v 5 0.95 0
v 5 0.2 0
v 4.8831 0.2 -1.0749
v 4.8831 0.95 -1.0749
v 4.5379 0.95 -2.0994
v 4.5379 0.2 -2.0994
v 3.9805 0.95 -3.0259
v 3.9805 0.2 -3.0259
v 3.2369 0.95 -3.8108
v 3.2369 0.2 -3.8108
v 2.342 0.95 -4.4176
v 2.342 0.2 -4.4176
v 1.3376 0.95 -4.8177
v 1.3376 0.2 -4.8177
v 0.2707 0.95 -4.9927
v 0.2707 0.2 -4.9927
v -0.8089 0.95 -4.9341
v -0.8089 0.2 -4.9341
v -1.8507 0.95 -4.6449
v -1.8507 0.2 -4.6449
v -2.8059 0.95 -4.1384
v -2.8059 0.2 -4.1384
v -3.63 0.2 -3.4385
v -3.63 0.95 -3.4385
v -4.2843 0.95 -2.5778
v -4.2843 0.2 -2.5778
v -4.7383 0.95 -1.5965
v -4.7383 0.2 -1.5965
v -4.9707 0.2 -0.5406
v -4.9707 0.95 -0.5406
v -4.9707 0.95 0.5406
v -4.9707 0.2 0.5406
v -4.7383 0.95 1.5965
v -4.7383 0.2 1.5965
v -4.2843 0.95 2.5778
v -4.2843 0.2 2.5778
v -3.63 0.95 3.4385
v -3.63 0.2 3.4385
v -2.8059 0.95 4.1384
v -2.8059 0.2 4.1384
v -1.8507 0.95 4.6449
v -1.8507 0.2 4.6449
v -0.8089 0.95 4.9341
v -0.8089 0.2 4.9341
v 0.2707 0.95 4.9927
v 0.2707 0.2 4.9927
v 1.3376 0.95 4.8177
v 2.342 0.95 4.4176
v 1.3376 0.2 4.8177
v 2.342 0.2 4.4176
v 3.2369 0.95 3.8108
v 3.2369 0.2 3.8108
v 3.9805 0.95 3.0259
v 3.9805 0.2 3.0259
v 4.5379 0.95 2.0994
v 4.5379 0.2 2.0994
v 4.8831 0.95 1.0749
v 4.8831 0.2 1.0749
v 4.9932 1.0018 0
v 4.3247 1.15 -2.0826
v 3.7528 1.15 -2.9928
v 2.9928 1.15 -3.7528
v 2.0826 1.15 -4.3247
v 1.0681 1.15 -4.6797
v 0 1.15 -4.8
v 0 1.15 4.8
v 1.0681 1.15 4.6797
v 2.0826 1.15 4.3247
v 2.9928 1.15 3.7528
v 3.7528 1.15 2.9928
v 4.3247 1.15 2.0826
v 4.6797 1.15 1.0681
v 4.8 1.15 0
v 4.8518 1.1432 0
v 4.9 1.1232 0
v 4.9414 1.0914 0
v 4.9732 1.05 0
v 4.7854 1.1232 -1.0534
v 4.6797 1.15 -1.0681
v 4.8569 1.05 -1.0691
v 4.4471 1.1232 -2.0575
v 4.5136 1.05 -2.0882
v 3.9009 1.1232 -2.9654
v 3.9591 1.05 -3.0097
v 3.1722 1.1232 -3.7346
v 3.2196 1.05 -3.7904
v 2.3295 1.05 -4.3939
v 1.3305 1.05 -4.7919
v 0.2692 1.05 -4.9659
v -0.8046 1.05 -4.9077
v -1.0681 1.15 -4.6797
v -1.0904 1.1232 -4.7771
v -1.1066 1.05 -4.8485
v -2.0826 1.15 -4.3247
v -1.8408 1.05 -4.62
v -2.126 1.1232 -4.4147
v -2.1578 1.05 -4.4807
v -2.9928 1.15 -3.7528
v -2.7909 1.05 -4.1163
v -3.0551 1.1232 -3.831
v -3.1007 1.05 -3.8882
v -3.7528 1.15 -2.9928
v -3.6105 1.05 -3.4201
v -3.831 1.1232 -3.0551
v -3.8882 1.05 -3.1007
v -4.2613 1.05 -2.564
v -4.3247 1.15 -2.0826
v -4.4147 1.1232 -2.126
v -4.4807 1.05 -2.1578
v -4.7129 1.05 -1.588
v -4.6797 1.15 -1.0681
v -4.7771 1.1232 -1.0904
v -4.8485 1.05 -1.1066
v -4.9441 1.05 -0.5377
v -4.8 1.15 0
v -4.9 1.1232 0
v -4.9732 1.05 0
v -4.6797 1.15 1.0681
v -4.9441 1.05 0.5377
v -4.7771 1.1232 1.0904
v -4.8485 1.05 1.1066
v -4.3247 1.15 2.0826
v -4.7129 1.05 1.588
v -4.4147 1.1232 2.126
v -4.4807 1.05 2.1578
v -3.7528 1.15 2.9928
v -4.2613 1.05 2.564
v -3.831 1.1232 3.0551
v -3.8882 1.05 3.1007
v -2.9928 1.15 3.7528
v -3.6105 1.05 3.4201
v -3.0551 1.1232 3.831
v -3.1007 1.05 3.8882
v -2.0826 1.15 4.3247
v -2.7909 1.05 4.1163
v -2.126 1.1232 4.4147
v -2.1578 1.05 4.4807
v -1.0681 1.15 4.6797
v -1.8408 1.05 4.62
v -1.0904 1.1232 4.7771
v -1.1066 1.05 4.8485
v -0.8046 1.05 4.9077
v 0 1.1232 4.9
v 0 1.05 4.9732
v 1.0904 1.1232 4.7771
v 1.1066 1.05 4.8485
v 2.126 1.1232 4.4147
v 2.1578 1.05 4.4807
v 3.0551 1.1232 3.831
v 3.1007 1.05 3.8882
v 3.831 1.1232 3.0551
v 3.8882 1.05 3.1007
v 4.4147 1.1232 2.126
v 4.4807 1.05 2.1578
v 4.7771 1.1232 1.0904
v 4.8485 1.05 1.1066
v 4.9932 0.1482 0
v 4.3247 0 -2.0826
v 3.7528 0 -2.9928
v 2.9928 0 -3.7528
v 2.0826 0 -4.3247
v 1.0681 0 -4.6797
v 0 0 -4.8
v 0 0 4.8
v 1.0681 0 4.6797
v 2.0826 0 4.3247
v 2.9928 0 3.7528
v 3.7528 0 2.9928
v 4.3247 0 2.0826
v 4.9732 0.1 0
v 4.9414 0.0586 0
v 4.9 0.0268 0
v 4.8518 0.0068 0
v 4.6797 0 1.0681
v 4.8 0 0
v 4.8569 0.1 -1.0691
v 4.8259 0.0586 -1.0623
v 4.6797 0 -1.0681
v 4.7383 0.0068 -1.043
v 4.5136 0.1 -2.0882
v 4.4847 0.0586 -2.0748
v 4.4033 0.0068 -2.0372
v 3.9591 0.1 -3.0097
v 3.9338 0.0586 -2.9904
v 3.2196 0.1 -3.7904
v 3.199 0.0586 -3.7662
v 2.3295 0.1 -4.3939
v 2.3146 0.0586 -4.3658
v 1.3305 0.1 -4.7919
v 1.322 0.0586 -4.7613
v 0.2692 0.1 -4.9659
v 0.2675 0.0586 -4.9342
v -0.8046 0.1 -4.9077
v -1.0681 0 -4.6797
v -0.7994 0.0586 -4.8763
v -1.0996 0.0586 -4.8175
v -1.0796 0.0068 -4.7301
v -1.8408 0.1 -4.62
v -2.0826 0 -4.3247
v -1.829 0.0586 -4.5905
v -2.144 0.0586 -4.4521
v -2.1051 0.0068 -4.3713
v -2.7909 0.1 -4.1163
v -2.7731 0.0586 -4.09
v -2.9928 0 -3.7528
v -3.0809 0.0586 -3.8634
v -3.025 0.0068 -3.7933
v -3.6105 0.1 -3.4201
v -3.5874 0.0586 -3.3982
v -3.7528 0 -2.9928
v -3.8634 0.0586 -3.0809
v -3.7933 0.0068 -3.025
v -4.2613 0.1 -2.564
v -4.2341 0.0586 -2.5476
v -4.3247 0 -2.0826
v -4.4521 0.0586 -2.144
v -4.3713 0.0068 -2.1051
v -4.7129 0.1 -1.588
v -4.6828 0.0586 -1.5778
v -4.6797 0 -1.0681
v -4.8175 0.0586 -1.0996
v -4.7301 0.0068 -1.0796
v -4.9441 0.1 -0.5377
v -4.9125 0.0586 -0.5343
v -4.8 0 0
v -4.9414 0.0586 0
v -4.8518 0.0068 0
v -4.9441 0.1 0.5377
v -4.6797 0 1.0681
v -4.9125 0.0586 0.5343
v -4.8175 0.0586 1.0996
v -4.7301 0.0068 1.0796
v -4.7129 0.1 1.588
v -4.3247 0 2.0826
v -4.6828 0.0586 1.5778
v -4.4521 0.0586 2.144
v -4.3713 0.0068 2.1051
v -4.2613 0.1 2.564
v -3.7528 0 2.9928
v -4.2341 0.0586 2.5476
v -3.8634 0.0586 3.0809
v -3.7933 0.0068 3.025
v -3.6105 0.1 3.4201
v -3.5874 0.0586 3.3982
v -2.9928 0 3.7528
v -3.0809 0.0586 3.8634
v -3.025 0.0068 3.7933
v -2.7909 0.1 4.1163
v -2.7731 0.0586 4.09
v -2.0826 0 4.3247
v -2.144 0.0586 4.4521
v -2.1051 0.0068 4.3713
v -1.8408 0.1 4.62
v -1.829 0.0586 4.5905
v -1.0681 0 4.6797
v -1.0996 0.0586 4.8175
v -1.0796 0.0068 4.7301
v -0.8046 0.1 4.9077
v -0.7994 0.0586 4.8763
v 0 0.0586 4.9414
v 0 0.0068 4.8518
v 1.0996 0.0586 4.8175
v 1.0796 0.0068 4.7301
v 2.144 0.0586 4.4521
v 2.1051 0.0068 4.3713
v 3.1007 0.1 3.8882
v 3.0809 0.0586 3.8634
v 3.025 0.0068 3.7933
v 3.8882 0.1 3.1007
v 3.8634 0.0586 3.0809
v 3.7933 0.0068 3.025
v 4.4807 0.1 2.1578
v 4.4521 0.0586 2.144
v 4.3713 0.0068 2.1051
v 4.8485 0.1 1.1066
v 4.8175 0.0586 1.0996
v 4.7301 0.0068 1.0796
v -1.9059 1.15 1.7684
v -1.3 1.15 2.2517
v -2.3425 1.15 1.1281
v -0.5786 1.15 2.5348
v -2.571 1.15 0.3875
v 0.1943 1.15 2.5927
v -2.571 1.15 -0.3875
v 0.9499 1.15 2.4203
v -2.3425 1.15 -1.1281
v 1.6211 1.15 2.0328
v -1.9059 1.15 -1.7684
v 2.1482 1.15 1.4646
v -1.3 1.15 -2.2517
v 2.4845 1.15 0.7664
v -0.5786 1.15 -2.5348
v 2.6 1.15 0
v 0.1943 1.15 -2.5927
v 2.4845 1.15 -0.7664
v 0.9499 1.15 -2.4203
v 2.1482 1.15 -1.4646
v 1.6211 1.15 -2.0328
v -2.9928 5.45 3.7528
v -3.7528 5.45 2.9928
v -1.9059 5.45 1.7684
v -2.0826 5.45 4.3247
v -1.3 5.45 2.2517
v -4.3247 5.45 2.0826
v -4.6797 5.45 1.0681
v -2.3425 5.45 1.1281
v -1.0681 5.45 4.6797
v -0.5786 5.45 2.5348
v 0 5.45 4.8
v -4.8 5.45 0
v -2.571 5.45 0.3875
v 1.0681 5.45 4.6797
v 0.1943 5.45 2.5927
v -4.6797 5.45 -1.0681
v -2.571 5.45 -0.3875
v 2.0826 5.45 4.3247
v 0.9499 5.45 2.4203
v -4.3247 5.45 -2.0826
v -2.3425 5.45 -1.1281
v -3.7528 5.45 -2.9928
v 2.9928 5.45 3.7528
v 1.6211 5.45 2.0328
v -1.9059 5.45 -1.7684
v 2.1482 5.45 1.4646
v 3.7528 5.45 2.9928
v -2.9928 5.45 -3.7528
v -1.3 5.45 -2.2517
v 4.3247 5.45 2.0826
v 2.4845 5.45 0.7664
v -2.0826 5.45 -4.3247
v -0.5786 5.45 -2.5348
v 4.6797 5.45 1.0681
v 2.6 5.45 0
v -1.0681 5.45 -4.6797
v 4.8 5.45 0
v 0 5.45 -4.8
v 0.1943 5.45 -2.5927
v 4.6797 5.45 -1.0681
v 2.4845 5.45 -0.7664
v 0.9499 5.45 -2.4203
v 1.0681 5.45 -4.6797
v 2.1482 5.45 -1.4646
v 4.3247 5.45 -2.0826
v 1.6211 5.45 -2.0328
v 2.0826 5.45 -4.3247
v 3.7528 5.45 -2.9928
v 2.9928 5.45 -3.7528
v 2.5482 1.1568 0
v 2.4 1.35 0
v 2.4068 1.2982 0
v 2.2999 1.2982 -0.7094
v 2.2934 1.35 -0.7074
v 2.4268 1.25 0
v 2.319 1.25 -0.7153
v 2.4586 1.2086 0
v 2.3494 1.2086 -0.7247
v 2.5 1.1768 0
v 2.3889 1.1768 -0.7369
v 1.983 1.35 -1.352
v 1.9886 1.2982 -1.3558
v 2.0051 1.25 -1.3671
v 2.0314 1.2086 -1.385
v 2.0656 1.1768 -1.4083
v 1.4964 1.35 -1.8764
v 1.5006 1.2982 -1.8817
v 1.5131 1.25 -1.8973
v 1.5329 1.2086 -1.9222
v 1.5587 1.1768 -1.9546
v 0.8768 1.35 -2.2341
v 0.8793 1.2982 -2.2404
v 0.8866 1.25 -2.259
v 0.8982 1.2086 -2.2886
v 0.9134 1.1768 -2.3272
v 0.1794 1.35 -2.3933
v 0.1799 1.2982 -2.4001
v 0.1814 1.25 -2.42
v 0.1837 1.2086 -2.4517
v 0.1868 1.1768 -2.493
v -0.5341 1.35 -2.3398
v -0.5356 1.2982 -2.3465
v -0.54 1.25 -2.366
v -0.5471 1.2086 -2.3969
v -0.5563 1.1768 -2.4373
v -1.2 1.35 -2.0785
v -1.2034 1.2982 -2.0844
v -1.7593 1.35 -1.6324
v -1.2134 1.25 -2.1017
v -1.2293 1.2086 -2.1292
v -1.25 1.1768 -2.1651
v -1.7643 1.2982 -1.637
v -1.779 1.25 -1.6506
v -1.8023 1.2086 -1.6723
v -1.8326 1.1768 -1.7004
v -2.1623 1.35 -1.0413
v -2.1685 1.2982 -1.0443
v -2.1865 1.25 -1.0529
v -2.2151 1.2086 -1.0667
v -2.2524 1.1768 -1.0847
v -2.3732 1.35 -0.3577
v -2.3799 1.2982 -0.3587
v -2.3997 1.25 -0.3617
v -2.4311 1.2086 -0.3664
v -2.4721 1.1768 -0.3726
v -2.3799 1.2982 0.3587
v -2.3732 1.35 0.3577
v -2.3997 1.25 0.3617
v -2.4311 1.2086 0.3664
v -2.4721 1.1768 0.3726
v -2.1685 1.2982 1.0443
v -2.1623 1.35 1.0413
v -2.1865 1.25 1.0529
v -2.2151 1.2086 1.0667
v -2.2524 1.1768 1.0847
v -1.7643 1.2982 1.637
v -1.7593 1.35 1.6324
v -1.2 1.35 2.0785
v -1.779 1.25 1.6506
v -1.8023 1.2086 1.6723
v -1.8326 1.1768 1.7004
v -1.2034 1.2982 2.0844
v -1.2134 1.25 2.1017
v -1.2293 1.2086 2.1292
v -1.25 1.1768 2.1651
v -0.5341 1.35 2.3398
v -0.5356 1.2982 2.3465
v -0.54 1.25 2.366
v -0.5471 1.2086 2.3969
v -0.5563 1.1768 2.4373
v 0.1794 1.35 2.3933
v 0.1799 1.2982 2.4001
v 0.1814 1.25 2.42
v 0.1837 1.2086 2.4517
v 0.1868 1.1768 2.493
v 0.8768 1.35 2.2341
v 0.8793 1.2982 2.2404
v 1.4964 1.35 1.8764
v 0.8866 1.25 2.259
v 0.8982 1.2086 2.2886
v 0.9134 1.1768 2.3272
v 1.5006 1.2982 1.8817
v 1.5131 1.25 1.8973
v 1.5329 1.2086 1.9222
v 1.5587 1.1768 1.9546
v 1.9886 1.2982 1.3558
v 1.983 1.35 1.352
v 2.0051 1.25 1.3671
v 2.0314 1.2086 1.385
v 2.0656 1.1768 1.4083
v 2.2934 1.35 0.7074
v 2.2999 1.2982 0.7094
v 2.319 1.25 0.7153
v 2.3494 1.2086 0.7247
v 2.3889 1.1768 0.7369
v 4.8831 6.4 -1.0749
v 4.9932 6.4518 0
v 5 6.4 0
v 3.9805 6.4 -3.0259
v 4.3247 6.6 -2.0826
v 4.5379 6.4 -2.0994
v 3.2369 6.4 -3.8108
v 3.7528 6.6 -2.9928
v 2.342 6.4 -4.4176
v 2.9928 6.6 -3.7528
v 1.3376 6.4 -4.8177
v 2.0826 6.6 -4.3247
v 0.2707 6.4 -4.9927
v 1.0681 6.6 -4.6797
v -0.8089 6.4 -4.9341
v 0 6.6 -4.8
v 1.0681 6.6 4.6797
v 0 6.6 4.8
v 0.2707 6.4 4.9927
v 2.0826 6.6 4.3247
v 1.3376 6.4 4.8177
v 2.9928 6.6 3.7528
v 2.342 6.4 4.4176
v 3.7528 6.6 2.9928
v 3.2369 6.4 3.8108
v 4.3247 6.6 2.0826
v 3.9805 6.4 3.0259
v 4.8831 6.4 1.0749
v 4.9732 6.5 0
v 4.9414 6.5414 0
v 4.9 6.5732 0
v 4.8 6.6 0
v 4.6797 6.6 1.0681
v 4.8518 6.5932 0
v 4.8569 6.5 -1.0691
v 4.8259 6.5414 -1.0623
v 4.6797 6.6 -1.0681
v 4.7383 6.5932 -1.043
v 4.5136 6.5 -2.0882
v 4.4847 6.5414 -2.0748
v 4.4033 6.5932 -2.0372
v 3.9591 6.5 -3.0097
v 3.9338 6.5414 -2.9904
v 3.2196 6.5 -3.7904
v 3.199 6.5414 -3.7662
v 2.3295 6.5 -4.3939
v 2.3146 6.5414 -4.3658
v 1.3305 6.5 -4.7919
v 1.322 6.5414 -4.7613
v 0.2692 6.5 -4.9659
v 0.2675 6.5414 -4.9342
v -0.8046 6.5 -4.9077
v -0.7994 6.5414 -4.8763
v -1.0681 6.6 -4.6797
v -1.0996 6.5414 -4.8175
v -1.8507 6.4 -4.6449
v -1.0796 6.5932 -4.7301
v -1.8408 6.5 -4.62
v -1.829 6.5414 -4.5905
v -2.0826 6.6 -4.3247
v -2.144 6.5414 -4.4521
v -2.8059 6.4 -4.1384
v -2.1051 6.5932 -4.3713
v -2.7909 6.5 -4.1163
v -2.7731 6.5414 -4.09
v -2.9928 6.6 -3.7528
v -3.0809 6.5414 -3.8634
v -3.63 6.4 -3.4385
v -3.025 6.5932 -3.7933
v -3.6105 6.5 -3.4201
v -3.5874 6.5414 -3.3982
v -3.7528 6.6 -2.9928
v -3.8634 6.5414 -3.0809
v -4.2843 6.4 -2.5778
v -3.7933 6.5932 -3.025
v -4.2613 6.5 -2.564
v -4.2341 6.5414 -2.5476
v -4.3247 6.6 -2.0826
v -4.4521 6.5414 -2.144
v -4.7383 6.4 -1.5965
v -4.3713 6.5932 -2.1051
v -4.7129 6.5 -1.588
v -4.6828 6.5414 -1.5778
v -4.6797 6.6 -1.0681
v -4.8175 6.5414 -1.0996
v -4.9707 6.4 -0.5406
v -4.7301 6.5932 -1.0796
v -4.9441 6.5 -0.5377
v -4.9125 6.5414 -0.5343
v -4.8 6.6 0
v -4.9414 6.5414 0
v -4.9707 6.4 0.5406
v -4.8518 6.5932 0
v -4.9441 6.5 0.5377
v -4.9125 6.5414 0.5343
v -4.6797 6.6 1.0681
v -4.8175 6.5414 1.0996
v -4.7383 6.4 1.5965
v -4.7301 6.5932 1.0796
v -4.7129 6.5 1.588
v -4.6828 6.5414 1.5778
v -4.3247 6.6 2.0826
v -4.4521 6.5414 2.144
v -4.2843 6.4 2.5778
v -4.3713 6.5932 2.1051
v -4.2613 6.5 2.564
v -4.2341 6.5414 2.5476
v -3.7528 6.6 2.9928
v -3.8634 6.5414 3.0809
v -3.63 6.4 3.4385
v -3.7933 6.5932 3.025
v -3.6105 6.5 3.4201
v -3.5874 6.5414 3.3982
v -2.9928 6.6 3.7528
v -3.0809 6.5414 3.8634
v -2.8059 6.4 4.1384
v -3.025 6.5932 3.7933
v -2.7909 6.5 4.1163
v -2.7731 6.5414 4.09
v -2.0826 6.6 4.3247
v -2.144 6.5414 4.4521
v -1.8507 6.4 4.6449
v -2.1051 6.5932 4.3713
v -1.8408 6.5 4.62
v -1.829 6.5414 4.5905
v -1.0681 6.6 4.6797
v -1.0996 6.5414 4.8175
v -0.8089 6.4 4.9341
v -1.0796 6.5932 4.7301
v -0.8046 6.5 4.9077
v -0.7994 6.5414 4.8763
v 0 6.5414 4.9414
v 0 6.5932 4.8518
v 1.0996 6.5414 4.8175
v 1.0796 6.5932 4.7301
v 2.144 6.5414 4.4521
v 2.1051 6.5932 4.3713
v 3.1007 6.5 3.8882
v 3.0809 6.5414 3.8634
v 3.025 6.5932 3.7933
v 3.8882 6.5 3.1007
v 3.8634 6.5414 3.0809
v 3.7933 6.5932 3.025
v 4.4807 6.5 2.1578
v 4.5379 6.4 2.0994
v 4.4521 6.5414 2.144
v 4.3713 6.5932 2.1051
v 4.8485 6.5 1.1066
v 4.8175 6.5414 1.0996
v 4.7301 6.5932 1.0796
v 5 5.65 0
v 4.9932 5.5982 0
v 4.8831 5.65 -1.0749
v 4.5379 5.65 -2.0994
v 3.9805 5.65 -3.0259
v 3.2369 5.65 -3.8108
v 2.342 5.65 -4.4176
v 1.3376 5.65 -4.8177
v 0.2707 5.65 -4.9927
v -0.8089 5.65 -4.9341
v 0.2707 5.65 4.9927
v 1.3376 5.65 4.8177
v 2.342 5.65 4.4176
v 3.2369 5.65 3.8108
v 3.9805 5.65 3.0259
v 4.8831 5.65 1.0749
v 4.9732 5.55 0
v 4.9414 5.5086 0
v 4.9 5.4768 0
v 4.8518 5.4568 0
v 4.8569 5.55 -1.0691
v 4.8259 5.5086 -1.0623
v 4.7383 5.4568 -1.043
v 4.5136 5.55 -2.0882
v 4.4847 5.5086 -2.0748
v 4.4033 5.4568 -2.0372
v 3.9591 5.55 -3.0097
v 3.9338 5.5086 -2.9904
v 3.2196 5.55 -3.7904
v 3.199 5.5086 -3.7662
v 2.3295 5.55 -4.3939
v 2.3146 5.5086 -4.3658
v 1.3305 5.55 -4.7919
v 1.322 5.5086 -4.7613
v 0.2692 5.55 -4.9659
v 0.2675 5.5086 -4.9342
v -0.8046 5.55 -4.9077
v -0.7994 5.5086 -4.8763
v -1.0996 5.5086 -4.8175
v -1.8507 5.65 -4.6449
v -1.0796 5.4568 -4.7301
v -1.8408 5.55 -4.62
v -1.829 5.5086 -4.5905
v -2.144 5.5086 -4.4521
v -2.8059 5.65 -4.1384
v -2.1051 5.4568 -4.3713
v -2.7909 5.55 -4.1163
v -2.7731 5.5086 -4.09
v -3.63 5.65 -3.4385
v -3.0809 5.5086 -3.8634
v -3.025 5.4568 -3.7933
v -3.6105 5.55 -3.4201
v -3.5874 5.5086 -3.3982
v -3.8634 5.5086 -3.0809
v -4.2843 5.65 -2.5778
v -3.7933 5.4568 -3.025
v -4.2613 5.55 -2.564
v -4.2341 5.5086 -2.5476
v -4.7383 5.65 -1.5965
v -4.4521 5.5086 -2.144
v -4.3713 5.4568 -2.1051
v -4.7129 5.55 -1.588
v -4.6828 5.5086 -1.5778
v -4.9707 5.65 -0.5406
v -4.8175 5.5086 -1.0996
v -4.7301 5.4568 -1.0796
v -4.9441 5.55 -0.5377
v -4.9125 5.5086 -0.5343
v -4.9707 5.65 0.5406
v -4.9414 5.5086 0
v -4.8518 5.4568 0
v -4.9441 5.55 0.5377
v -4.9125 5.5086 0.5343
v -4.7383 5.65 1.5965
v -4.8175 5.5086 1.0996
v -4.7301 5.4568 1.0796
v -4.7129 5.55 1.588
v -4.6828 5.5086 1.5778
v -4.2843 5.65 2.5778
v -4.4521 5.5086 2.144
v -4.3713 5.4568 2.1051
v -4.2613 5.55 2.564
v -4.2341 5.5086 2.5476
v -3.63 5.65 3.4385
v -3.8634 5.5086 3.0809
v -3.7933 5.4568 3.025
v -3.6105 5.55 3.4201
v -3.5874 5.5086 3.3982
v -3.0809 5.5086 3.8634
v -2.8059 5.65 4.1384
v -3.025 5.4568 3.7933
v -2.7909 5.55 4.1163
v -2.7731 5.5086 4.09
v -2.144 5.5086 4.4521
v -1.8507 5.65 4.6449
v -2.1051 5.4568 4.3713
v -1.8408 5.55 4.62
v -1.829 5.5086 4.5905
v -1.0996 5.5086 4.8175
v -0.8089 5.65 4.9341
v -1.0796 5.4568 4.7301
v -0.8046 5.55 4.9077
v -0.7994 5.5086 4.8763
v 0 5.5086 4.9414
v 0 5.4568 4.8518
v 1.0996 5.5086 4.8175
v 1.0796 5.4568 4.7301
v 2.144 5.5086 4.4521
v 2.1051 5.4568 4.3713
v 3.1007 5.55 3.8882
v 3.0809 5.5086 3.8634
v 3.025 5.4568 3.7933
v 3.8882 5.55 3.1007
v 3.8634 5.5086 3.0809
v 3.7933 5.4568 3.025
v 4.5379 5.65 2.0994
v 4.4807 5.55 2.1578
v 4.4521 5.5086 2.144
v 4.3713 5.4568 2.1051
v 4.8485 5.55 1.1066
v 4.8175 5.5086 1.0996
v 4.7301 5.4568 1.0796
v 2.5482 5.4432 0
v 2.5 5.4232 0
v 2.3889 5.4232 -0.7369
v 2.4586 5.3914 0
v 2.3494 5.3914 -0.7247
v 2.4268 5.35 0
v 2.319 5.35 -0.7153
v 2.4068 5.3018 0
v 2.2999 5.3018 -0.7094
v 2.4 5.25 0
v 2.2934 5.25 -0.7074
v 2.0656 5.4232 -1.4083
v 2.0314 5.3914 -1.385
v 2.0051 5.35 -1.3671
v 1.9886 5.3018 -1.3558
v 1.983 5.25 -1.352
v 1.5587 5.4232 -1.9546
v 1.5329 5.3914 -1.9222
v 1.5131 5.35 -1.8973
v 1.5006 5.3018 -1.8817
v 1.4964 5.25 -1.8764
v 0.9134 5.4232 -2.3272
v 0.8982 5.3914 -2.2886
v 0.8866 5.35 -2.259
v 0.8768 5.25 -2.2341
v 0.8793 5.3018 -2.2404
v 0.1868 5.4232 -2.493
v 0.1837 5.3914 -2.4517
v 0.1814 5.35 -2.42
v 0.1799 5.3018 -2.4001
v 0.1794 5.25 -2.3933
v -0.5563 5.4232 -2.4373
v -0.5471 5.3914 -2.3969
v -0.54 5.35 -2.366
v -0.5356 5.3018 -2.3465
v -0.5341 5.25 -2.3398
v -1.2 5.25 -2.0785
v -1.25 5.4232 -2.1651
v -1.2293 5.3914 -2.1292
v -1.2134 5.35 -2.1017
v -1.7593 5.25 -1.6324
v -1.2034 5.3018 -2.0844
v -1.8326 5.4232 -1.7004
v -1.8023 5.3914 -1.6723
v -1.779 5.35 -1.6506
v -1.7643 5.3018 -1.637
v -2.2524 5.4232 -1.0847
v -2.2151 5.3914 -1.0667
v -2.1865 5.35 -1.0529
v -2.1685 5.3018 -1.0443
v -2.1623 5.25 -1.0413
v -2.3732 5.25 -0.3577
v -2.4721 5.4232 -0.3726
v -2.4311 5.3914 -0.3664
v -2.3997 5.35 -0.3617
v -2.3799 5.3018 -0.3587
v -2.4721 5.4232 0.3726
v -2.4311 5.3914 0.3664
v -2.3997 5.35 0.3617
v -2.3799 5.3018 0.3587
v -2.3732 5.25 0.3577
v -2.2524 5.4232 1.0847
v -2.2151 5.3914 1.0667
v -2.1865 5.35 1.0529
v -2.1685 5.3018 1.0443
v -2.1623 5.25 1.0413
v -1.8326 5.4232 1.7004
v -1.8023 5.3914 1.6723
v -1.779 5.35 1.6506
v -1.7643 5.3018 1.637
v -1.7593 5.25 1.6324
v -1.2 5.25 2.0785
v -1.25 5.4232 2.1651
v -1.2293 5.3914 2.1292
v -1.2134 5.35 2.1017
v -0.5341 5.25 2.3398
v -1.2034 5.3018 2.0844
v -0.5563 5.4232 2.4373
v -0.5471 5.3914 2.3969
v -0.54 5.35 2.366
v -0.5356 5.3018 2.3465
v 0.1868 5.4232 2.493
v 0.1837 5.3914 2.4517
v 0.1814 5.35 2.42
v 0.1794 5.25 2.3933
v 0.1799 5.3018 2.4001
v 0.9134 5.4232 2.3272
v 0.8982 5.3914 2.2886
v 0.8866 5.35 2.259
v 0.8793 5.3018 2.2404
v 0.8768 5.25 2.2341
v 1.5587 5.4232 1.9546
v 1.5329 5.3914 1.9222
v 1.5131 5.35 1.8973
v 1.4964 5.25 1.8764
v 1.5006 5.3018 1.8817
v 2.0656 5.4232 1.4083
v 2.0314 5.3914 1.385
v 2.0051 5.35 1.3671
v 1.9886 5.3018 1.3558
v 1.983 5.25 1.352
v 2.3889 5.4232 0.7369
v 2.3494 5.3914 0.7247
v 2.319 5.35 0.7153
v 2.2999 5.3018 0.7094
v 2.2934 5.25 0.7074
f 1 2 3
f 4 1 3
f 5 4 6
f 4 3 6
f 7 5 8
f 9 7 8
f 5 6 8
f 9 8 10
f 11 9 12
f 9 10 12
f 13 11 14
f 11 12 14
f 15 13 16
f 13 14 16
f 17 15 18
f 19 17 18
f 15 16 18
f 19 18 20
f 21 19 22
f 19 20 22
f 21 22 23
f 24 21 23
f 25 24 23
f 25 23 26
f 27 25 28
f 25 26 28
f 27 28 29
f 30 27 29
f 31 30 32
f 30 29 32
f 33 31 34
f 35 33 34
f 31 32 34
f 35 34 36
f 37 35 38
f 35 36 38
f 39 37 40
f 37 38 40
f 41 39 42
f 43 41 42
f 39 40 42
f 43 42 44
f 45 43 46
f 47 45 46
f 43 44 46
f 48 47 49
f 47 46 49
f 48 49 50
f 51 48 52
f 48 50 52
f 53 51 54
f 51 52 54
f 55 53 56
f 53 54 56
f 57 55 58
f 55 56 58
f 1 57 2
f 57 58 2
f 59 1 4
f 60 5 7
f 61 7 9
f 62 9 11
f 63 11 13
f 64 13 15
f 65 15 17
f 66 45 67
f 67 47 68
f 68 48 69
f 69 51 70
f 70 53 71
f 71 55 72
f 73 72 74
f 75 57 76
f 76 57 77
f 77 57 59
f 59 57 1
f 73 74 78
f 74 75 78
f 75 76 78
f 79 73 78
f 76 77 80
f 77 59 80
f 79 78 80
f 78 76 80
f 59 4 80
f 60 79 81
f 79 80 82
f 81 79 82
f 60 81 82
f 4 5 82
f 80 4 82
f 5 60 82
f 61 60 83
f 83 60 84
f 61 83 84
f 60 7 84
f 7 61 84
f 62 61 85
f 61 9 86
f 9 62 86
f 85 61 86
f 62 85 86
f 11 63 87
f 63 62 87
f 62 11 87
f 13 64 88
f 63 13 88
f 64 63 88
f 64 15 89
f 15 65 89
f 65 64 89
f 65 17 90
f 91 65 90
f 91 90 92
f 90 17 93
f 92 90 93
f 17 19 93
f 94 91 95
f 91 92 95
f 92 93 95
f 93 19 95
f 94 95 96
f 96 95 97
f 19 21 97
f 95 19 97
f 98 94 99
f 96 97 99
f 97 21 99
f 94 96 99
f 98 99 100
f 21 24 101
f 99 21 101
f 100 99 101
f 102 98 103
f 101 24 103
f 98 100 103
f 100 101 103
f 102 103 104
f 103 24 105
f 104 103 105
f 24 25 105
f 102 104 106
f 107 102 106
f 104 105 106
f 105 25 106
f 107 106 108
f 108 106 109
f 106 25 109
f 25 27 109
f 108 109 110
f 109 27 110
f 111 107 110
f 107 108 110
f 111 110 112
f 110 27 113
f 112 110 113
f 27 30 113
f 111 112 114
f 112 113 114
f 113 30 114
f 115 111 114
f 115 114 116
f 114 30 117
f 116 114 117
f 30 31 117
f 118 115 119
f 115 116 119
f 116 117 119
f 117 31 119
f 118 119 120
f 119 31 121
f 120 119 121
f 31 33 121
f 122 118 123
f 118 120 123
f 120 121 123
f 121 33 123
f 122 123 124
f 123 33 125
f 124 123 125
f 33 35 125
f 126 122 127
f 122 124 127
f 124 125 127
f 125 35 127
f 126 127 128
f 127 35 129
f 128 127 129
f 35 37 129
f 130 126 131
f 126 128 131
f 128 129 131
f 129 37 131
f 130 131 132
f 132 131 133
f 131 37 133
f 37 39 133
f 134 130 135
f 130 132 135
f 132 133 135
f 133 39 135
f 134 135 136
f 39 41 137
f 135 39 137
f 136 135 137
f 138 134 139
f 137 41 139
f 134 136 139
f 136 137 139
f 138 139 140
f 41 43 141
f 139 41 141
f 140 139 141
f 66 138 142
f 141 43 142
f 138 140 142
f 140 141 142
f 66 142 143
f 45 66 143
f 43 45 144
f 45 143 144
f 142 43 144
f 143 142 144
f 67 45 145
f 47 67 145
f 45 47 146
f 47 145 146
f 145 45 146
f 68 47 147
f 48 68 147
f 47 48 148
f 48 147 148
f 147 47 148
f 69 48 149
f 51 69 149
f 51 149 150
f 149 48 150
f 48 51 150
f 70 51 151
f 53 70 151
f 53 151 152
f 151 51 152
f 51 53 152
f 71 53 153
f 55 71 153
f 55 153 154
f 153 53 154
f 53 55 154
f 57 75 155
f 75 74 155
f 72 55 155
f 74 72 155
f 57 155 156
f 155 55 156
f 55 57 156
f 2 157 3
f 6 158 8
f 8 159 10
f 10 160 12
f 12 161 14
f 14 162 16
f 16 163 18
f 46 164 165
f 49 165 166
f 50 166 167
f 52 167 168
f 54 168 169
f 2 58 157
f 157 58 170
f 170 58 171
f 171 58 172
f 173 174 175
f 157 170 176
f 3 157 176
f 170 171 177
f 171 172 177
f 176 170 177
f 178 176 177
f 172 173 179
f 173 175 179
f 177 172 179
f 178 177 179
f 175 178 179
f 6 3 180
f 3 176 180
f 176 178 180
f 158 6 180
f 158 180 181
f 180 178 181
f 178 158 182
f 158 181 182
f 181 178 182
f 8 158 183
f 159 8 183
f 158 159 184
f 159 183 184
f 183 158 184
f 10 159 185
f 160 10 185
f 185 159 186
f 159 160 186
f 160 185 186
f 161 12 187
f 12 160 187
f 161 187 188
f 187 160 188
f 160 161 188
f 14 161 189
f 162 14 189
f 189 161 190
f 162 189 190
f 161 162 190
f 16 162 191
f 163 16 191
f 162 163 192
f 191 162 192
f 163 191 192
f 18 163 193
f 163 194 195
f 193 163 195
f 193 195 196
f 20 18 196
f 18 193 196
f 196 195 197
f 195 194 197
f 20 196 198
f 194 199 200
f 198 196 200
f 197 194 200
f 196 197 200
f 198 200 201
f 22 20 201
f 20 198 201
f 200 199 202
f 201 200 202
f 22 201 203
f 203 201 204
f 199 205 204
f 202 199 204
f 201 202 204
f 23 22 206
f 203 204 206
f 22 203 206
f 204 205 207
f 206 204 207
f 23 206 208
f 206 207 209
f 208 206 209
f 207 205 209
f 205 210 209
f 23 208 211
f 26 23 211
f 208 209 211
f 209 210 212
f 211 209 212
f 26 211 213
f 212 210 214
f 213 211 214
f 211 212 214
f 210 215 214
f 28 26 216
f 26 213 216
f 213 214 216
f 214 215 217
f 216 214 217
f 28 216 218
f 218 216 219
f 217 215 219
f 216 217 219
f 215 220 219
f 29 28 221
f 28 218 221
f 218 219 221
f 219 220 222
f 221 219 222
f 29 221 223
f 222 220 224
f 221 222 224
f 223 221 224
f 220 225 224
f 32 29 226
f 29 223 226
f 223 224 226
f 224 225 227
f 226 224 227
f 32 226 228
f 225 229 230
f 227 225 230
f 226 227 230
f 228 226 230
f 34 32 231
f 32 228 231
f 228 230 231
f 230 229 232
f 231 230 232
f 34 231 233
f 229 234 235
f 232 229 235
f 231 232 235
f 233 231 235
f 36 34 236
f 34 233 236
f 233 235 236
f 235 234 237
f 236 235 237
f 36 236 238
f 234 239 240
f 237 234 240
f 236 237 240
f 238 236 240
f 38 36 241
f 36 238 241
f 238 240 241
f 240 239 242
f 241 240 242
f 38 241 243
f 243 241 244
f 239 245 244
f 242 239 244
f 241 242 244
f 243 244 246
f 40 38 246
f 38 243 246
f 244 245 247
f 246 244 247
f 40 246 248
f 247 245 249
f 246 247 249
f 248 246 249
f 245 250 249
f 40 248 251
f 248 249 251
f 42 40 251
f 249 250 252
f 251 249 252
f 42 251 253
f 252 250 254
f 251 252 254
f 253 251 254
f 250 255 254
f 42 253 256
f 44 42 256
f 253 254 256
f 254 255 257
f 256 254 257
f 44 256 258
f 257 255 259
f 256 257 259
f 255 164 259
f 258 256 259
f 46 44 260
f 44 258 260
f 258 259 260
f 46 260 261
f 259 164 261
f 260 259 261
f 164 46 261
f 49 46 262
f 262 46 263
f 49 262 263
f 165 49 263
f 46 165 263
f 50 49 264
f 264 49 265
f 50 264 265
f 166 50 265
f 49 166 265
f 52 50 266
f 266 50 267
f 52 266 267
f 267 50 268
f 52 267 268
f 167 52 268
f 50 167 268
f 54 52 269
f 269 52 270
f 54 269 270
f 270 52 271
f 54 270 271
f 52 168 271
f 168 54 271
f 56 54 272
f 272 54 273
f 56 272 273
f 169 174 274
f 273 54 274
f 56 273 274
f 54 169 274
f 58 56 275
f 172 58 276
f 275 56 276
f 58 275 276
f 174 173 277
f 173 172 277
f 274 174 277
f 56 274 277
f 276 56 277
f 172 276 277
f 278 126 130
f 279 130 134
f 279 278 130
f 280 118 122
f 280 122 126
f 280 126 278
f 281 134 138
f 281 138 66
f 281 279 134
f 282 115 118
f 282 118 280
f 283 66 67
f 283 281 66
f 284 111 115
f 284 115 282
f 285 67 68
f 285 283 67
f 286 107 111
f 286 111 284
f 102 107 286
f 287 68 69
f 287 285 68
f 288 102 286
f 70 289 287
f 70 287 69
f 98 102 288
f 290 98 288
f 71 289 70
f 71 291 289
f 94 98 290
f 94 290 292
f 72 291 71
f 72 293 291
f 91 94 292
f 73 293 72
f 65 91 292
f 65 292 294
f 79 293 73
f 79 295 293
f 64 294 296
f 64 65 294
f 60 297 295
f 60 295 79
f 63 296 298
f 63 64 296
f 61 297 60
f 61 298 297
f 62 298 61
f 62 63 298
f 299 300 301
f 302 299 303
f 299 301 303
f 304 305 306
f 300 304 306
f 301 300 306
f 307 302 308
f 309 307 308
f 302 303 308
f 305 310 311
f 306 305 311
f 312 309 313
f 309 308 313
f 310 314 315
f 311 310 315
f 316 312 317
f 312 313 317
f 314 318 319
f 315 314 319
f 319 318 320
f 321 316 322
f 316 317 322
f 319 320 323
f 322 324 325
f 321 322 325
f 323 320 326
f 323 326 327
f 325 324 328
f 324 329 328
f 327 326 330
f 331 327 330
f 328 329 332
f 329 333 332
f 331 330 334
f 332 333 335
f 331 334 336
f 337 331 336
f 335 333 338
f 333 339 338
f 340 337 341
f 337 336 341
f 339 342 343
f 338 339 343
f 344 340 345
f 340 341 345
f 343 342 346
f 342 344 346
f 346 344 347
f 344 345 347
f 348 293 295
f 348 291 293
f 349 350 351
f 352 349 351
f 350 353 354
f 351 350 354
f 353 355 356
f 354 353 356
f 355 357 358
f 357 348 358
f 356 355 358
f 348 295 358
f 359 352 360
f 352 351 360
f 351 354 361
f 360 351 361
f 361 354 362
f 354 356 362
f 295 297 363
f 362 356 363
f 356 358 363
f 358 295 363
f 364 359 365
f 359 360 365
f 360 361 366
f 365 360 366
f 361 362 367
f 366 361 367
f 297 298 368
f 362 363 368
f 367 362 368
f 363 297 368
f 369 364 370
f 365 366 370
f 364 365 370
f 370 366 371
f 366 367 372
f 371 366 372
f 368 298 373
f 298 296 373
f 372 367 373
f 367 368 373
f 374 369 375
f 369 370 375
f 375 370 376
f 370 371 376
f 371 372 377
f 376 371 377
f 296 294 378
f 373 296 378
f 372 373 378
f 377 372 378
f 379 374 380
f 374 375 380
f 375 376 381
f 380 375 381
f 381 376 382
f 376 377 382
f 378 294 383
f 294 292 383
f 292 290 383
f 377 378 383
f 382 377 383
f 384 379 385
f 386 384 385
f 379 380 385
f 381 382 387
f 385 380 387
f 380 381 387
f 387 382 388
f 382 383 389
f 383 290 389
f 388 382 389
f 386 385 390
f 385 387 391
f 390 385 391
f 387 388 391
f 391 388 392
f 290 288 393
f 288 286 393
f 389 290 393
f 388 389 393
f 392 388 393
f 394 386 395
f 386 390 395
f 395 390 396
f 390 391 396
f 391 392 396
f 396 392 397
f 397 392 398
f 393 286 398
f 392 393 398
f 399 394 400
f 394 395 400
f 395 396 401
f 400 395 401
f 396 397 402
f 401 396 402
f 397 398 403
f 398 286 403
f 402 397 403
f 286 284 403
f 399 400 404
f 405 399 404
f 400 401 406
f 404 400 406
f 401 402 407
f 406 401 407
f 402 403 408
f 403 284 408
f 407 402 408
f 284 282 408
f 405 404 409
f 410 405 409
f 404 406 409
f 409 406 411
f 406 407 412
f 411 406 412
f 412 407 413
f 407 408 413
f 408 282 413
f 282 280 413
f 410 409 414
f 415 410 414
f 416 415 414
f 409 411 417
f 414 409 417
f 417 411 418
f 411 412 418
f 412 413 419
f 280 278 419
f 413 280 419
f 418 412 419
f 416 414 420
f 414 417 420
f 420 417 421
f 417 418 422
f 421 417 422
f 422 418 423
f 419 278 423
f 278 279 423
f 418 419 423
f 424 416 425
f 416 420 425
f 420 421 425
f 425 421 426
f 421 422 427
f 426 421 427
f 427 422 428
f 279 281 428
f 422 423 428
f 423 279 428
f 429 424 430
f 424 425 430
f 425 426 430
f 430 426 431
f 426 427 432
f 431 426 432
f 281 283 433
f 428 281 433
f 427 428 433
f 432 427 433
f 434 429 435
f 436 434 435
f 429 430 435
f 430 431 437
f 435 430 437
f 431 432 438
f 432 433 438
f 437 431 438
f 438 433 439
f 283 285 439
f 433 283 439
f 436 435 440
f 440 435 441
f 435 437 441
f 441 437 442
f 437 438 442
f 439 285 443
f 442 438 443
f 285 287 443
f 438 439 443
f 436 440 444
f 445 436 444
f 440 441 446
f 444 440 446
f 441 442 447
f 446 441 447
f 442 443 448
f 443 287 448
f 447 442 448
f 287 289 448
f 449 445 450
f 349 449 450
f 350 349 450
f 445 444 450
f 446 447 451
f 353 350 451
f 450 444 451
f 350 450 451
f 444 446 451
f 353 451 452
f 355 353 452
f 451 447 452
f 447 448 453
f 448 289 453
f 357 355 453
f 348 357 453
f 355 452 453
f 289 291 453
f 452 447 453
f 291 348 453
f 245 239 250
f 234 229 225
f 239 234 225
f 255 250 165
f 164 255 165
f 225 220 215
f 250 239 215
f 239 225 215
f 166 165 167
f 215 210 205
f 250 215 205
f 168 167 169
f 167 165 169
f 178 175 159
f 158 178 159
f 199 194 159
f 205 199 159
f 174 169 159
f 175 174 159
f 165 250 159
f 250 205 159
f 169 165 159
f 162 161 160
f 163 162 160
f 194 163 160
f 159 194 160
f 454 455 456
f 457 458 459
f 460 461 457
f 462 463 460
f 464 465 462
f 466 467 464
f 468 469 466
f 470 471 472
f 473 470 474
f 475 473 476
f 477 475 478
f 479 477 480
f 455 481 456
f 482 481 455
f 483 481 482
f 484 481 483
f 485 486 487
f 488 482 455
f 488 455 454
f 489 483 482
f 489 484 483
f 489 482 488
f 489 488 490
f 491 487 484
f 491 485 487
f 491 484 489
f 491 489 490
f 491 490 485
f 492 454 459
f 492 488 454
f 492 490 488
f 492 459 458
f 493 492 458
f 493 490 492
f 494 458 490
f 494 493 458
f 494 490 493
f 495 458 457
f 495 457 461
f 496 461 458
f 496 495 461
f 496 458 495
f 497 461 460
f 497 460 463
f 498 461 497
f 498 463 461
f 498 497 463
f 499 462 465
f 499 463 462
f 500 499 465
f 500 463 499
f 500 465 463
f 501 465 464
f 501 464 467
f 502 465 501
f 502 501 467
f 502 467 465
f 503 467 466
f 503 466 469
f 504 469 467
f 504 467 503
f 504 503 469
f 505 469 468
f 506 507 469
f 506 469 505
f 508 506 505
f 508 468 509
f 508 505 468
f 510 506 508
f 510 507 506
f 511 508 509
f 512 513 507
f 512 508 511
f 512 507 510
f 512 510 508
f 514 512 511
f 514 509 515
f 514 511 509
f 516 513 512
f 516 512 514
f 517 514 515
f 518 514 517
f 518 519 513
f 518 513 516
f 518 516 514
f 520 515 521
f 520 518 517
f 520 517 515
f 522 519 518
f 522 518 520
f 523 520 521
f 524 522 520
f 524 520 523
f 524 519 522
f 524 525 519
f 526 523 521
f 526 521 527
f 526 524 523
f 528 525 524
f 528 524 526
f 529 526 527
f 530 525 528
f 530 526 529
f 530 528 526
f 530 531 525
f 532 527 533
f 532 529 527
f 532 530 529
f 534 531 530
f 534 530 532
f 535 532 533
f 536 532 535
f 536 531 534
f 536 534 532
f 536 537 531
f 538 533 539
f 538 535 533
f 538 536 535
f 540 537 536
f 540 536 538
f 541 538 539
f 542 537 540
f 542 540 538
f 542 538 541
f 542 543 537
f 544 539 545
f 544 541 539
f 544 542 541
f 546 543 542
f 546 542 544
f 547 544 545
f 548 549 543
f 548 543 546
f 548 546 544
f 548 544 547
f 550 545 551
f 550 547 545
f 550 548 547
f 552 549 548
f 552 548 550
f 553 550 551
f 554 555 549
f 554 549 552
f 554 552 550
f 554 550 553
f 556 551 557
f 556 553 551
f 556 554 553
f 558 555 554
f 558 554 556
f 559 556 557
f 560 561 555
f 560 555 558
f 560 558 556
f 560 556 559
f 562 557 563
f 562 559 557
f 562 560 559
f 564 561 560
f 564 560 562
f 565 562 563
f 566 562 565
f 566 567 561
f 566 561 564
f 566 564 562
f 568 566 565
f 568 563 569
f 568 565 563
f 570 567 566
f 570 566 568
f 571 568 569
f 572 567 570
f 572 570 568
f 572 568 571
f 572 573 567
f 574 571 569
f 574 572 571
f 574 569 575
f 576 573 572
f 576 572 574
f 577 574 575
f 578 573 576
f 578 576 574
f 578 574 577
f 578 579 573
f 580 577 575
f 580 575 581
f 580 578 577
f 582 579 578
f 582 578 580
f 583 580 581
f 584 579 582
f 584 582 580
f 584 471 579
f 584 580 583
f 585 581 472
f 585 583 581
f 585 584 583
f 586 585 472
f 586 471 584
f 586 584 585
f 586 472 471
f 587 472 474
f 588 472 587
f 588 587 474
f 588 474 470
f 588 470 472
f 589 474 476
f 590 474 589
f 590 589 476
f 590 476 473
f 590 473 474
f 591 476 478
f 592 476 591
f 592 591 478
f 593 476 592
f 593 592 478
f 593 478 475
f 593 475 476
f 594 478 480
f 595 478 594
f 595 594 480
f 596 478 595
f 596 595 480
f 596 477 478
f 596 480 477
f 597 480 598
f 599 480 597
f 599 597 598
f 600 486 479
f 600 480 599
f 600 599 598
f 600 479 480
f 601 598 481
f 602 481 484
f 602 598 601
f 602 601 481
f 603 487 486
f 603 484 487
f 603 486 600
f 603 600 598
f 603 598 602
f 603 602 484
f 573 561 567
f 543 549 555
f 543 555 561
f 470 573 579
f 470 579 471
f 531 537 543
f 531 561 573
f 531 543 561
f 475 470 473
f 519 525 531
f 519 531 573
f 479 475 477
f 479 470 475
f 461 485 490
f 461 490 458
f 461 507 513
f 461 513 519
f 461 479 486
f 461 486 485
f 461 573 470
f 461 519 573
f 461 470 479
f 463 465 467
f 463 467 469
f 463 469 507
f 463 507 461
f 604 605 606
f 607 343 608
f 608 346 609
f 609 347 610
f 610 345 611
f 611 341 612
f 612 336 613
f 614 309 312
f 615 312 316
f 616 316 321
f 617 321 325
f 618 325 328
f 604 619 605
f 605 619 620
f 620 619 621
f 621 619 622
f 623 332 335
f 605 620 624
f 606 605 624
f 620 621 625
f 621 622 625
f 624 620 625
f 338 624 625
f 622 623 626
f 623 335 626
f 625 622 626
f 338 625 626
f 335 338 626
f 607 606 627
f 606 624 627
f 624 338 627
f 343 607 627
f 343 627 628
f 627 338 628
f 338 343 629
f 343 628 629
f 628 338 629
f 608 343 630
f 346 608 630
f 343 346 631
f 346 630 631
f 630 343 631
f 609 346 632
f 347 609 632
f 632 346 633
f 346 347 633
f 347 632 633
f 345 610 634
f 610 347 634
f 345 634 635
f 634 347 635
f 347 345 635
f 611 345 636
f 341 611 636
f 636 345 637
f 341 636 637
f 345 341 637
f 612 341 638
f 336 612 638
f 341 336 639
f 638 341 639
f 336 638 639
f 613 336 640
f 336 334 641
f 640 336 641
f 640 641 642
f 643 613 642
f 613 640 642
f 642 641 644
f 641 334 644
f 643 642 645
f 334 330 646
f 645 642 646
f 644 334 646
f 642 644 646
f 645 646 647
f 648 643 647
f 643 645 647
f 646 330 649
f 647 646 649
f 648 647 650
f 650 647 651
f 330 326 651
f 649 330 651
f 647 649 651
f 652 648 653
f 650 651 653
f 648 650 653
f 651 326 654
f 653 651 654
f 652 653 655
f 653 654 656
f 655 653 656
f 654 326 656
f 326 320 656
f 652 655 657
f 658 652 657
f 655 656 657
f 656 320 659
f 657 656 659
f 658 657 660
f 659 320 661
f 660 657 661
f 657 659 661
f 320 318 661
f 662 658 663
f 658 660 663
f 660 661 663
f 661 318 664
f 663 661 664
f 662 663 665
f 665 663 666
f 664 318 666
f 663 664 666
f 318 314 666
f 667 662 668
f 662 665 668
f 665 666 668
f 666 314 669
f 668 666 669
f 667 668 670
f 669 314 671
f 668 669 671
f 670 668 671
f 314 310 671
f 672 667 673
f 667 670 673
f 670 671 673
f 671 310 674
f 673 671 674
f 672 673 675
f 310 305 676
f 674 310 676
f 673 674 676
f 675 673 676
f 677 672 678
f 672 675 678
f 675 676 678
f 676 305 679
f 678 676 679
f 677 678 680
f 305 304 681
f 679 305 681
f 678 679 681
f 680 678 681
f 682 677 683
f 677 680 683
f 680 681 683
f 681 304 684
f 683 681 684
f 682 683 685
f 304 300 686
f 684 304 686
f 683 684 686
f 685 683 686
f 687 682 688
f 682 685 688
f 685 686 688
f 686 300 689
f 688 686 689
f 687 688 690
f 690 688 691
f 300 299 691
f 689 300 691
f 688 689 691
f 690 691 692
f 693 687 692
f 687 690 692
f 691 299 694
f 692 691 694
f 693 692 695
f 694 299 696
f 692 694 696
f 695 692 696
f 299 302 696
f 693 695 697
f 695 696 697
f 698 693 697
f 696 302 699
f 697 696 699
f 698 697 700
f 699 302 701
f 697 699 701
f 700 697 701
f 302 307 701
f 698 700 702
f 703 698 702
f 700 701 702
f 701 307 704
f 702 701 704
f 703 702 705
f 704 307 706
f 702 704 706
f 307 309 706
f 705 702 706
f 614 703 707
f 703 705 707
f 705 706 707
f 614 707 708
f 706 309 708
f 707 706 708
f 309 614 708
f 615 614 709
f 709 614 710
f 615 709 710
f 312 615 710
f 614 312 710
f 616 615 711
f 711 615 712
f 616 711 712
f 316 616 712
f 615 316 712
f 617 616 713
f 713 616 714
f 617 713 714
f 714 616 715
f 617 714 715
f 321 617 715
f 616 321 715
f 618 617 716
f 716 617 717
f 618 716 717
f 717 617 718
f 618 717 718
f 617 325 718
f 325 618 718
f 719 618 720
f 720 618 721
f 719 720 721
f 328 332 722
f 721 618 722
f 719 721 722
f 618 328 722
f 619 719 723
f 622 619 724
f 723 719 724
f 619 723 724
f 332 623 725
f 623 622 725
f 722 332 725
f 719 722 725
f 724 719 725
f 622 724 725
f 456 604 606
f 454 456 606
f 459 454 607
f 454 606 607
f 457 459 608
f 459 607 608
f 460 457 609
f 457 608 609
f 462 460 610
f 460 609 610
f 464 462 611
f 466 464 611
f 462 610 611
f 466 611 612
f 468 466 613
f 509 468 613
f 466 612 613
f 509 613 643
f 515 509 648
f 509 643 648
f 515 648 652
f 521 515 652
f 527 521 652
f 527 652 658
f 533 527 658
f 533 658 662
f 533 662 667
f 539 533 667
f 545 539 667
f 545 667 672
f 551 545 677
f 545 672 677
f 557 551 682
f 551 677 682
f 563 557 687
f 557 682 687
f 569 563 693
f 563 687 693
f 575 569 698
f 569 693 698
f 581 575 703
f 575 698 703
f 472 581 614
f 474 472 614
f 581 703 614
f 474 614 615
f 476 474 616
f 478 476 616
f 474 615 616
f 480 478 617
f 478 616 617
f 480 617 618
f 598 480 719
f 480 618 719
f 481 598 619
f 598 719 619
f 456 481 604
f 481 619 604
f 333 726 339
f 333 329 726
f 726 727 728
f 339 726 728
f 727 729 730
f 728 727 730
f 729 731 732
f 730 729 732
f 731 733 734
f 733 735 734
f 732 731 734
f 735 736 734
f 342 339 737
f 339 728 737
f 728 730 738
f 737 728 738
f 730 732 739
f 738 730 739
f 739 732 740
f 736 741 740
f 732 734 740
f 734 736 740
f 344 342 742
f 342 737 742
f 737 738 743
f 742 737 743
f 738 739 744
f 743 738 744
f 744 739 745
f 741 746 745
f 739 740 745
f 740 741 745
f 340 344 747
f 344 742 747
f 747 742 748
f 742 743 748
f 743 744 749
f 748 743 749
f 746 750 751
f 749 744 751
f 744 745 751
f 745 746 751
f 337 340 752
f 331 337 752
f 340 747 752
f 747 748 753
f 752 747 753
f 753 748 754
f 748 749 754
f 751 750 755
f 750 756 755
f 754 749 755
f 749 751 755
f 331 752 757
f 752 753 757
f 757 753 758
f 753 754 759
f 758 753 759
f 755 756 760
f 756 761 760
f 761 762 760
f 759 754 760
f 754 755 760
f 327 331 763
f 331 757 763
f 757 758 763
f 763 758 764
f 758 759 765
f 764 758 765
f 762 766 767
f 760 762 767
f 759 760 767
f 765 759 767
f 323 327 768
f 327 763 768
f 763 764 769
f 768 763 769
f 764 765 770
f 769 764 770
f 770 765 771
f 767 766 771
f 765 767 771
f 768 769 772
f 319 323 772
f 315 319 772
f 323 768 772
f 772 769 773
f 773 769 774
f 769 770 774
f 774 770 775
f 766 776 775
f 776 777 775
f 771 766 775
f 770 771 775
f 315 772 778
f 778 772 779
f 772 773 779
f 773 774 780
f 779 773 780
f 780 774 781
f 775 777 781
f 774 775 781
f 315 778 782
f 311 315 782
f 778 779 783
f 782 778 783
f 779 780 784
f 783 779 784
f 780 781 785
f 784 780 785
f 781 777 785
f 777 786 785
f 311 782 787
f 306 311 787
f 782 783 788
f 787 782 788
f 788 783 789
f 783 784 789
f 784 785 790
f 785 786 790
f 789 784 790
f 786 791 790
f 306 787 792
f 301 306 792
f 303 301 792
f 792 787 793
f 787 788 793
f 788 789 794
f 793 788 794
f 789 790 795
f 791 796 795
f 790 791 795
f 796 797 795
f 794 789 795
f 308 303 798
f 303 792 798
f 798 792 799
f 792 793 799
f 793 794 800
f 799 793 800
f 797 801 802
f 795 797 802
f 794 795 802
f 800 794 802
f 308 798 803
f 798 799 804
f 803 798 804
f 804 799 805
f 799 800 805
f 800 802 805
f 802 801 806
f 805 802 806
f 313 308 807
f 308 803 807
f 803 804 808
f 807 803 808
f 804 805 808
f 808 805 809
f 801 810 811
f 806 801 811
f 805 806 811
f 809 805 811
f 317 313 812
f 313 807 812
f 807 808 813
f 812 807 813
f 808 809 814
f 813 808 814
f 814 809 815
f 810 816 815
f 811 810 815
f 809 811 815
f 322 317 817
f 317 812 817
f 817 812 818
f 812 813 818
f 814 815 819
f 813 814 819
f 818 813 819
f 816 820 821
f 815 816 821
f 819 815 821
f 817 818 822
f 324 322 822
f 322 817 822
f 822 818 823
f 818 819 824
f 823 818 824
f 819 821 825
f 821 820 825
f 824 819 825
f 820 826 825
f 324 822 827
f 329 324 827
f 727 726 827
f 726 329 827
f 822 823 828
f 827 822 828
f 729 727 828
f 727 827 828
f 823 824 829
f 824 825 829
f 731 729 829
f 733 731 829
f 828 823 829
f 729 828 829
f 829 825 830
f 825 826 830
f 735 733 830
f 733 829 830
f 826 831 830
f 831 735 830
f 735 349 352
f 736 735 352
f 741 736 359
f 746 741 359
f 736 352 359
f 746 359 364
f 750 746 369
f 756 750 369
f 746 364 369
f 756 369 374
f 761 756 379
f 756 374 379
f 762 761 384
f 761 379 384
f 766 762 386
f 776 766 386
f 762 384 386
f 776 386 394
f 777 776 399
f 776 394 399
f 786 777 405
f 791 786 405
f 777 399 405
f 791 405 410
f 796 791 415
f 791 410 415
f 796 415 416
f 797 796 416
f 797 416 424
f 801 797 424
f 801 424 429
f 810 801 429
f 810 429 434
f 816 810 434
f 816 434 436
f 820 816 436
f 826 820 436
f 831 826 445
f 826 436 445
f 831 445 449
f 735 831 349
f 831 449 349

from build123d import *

# Parameters (mm, degrees)
SKETCH1_R           = 5
BOSS_EXTRUDE1_DEPTH = 1.15
SKETCH2_R           = 2.4
BOSS_EXTRUDE2_DEPTH = 4.3
SKETCH3_R           = 5
BOSS_EXTRUDE3_DEPTH = 1.15
FILLET1_R           = 0.2


with BuildPart() as part:
    # Sketch1 → Boss-Extrude1 (new body)
    with BuildSketch(Plane(origin=(0, 0, 0), x_dir=(1, 0, 0), z_dir=(0, 1, 0))):
        Circle(SKETCH1_R)
    extrude(amount=BOSS_EXTRUDE1_DEPTH)

    # Sketch2 → Boss-Extrude2 (add)
    with BuildSketch(Plane(origin=(0, 1.15, 0), x_dir=(1, 0, 0), z_dir=(0, 1, 0))):
        Circle(SKETCH2_R)
    extrude(amount=BOSS_EXTRUDE2_DEPTH)

    # Sketch3 → Boss-Extrude3 (add)
    with BuildSketch(Plane(origin=(0, 5.45, 0), x_dir=(1, 0, 0), z_dir=(0, 1, 0))):
        Circle(SKETCH3_R)
    extrude(amount=BOSS_EXTRUDE3_DEPTH)

    # Fillet1
    fillet1_edges = [part.edges().sort_by_distance(p)[0] for p in [
        (-5, 5.45, 0),
        (-5, 6.6, 0),
        (-5, 0, 0),
        (-5, 1.15, 0),
        (-2.4, 1.15, 0),
        (-2.4, 5.45, 0),
    ]]
    fillet(fillet1_edges, radius=FILLET1_R)


solid = part.part
